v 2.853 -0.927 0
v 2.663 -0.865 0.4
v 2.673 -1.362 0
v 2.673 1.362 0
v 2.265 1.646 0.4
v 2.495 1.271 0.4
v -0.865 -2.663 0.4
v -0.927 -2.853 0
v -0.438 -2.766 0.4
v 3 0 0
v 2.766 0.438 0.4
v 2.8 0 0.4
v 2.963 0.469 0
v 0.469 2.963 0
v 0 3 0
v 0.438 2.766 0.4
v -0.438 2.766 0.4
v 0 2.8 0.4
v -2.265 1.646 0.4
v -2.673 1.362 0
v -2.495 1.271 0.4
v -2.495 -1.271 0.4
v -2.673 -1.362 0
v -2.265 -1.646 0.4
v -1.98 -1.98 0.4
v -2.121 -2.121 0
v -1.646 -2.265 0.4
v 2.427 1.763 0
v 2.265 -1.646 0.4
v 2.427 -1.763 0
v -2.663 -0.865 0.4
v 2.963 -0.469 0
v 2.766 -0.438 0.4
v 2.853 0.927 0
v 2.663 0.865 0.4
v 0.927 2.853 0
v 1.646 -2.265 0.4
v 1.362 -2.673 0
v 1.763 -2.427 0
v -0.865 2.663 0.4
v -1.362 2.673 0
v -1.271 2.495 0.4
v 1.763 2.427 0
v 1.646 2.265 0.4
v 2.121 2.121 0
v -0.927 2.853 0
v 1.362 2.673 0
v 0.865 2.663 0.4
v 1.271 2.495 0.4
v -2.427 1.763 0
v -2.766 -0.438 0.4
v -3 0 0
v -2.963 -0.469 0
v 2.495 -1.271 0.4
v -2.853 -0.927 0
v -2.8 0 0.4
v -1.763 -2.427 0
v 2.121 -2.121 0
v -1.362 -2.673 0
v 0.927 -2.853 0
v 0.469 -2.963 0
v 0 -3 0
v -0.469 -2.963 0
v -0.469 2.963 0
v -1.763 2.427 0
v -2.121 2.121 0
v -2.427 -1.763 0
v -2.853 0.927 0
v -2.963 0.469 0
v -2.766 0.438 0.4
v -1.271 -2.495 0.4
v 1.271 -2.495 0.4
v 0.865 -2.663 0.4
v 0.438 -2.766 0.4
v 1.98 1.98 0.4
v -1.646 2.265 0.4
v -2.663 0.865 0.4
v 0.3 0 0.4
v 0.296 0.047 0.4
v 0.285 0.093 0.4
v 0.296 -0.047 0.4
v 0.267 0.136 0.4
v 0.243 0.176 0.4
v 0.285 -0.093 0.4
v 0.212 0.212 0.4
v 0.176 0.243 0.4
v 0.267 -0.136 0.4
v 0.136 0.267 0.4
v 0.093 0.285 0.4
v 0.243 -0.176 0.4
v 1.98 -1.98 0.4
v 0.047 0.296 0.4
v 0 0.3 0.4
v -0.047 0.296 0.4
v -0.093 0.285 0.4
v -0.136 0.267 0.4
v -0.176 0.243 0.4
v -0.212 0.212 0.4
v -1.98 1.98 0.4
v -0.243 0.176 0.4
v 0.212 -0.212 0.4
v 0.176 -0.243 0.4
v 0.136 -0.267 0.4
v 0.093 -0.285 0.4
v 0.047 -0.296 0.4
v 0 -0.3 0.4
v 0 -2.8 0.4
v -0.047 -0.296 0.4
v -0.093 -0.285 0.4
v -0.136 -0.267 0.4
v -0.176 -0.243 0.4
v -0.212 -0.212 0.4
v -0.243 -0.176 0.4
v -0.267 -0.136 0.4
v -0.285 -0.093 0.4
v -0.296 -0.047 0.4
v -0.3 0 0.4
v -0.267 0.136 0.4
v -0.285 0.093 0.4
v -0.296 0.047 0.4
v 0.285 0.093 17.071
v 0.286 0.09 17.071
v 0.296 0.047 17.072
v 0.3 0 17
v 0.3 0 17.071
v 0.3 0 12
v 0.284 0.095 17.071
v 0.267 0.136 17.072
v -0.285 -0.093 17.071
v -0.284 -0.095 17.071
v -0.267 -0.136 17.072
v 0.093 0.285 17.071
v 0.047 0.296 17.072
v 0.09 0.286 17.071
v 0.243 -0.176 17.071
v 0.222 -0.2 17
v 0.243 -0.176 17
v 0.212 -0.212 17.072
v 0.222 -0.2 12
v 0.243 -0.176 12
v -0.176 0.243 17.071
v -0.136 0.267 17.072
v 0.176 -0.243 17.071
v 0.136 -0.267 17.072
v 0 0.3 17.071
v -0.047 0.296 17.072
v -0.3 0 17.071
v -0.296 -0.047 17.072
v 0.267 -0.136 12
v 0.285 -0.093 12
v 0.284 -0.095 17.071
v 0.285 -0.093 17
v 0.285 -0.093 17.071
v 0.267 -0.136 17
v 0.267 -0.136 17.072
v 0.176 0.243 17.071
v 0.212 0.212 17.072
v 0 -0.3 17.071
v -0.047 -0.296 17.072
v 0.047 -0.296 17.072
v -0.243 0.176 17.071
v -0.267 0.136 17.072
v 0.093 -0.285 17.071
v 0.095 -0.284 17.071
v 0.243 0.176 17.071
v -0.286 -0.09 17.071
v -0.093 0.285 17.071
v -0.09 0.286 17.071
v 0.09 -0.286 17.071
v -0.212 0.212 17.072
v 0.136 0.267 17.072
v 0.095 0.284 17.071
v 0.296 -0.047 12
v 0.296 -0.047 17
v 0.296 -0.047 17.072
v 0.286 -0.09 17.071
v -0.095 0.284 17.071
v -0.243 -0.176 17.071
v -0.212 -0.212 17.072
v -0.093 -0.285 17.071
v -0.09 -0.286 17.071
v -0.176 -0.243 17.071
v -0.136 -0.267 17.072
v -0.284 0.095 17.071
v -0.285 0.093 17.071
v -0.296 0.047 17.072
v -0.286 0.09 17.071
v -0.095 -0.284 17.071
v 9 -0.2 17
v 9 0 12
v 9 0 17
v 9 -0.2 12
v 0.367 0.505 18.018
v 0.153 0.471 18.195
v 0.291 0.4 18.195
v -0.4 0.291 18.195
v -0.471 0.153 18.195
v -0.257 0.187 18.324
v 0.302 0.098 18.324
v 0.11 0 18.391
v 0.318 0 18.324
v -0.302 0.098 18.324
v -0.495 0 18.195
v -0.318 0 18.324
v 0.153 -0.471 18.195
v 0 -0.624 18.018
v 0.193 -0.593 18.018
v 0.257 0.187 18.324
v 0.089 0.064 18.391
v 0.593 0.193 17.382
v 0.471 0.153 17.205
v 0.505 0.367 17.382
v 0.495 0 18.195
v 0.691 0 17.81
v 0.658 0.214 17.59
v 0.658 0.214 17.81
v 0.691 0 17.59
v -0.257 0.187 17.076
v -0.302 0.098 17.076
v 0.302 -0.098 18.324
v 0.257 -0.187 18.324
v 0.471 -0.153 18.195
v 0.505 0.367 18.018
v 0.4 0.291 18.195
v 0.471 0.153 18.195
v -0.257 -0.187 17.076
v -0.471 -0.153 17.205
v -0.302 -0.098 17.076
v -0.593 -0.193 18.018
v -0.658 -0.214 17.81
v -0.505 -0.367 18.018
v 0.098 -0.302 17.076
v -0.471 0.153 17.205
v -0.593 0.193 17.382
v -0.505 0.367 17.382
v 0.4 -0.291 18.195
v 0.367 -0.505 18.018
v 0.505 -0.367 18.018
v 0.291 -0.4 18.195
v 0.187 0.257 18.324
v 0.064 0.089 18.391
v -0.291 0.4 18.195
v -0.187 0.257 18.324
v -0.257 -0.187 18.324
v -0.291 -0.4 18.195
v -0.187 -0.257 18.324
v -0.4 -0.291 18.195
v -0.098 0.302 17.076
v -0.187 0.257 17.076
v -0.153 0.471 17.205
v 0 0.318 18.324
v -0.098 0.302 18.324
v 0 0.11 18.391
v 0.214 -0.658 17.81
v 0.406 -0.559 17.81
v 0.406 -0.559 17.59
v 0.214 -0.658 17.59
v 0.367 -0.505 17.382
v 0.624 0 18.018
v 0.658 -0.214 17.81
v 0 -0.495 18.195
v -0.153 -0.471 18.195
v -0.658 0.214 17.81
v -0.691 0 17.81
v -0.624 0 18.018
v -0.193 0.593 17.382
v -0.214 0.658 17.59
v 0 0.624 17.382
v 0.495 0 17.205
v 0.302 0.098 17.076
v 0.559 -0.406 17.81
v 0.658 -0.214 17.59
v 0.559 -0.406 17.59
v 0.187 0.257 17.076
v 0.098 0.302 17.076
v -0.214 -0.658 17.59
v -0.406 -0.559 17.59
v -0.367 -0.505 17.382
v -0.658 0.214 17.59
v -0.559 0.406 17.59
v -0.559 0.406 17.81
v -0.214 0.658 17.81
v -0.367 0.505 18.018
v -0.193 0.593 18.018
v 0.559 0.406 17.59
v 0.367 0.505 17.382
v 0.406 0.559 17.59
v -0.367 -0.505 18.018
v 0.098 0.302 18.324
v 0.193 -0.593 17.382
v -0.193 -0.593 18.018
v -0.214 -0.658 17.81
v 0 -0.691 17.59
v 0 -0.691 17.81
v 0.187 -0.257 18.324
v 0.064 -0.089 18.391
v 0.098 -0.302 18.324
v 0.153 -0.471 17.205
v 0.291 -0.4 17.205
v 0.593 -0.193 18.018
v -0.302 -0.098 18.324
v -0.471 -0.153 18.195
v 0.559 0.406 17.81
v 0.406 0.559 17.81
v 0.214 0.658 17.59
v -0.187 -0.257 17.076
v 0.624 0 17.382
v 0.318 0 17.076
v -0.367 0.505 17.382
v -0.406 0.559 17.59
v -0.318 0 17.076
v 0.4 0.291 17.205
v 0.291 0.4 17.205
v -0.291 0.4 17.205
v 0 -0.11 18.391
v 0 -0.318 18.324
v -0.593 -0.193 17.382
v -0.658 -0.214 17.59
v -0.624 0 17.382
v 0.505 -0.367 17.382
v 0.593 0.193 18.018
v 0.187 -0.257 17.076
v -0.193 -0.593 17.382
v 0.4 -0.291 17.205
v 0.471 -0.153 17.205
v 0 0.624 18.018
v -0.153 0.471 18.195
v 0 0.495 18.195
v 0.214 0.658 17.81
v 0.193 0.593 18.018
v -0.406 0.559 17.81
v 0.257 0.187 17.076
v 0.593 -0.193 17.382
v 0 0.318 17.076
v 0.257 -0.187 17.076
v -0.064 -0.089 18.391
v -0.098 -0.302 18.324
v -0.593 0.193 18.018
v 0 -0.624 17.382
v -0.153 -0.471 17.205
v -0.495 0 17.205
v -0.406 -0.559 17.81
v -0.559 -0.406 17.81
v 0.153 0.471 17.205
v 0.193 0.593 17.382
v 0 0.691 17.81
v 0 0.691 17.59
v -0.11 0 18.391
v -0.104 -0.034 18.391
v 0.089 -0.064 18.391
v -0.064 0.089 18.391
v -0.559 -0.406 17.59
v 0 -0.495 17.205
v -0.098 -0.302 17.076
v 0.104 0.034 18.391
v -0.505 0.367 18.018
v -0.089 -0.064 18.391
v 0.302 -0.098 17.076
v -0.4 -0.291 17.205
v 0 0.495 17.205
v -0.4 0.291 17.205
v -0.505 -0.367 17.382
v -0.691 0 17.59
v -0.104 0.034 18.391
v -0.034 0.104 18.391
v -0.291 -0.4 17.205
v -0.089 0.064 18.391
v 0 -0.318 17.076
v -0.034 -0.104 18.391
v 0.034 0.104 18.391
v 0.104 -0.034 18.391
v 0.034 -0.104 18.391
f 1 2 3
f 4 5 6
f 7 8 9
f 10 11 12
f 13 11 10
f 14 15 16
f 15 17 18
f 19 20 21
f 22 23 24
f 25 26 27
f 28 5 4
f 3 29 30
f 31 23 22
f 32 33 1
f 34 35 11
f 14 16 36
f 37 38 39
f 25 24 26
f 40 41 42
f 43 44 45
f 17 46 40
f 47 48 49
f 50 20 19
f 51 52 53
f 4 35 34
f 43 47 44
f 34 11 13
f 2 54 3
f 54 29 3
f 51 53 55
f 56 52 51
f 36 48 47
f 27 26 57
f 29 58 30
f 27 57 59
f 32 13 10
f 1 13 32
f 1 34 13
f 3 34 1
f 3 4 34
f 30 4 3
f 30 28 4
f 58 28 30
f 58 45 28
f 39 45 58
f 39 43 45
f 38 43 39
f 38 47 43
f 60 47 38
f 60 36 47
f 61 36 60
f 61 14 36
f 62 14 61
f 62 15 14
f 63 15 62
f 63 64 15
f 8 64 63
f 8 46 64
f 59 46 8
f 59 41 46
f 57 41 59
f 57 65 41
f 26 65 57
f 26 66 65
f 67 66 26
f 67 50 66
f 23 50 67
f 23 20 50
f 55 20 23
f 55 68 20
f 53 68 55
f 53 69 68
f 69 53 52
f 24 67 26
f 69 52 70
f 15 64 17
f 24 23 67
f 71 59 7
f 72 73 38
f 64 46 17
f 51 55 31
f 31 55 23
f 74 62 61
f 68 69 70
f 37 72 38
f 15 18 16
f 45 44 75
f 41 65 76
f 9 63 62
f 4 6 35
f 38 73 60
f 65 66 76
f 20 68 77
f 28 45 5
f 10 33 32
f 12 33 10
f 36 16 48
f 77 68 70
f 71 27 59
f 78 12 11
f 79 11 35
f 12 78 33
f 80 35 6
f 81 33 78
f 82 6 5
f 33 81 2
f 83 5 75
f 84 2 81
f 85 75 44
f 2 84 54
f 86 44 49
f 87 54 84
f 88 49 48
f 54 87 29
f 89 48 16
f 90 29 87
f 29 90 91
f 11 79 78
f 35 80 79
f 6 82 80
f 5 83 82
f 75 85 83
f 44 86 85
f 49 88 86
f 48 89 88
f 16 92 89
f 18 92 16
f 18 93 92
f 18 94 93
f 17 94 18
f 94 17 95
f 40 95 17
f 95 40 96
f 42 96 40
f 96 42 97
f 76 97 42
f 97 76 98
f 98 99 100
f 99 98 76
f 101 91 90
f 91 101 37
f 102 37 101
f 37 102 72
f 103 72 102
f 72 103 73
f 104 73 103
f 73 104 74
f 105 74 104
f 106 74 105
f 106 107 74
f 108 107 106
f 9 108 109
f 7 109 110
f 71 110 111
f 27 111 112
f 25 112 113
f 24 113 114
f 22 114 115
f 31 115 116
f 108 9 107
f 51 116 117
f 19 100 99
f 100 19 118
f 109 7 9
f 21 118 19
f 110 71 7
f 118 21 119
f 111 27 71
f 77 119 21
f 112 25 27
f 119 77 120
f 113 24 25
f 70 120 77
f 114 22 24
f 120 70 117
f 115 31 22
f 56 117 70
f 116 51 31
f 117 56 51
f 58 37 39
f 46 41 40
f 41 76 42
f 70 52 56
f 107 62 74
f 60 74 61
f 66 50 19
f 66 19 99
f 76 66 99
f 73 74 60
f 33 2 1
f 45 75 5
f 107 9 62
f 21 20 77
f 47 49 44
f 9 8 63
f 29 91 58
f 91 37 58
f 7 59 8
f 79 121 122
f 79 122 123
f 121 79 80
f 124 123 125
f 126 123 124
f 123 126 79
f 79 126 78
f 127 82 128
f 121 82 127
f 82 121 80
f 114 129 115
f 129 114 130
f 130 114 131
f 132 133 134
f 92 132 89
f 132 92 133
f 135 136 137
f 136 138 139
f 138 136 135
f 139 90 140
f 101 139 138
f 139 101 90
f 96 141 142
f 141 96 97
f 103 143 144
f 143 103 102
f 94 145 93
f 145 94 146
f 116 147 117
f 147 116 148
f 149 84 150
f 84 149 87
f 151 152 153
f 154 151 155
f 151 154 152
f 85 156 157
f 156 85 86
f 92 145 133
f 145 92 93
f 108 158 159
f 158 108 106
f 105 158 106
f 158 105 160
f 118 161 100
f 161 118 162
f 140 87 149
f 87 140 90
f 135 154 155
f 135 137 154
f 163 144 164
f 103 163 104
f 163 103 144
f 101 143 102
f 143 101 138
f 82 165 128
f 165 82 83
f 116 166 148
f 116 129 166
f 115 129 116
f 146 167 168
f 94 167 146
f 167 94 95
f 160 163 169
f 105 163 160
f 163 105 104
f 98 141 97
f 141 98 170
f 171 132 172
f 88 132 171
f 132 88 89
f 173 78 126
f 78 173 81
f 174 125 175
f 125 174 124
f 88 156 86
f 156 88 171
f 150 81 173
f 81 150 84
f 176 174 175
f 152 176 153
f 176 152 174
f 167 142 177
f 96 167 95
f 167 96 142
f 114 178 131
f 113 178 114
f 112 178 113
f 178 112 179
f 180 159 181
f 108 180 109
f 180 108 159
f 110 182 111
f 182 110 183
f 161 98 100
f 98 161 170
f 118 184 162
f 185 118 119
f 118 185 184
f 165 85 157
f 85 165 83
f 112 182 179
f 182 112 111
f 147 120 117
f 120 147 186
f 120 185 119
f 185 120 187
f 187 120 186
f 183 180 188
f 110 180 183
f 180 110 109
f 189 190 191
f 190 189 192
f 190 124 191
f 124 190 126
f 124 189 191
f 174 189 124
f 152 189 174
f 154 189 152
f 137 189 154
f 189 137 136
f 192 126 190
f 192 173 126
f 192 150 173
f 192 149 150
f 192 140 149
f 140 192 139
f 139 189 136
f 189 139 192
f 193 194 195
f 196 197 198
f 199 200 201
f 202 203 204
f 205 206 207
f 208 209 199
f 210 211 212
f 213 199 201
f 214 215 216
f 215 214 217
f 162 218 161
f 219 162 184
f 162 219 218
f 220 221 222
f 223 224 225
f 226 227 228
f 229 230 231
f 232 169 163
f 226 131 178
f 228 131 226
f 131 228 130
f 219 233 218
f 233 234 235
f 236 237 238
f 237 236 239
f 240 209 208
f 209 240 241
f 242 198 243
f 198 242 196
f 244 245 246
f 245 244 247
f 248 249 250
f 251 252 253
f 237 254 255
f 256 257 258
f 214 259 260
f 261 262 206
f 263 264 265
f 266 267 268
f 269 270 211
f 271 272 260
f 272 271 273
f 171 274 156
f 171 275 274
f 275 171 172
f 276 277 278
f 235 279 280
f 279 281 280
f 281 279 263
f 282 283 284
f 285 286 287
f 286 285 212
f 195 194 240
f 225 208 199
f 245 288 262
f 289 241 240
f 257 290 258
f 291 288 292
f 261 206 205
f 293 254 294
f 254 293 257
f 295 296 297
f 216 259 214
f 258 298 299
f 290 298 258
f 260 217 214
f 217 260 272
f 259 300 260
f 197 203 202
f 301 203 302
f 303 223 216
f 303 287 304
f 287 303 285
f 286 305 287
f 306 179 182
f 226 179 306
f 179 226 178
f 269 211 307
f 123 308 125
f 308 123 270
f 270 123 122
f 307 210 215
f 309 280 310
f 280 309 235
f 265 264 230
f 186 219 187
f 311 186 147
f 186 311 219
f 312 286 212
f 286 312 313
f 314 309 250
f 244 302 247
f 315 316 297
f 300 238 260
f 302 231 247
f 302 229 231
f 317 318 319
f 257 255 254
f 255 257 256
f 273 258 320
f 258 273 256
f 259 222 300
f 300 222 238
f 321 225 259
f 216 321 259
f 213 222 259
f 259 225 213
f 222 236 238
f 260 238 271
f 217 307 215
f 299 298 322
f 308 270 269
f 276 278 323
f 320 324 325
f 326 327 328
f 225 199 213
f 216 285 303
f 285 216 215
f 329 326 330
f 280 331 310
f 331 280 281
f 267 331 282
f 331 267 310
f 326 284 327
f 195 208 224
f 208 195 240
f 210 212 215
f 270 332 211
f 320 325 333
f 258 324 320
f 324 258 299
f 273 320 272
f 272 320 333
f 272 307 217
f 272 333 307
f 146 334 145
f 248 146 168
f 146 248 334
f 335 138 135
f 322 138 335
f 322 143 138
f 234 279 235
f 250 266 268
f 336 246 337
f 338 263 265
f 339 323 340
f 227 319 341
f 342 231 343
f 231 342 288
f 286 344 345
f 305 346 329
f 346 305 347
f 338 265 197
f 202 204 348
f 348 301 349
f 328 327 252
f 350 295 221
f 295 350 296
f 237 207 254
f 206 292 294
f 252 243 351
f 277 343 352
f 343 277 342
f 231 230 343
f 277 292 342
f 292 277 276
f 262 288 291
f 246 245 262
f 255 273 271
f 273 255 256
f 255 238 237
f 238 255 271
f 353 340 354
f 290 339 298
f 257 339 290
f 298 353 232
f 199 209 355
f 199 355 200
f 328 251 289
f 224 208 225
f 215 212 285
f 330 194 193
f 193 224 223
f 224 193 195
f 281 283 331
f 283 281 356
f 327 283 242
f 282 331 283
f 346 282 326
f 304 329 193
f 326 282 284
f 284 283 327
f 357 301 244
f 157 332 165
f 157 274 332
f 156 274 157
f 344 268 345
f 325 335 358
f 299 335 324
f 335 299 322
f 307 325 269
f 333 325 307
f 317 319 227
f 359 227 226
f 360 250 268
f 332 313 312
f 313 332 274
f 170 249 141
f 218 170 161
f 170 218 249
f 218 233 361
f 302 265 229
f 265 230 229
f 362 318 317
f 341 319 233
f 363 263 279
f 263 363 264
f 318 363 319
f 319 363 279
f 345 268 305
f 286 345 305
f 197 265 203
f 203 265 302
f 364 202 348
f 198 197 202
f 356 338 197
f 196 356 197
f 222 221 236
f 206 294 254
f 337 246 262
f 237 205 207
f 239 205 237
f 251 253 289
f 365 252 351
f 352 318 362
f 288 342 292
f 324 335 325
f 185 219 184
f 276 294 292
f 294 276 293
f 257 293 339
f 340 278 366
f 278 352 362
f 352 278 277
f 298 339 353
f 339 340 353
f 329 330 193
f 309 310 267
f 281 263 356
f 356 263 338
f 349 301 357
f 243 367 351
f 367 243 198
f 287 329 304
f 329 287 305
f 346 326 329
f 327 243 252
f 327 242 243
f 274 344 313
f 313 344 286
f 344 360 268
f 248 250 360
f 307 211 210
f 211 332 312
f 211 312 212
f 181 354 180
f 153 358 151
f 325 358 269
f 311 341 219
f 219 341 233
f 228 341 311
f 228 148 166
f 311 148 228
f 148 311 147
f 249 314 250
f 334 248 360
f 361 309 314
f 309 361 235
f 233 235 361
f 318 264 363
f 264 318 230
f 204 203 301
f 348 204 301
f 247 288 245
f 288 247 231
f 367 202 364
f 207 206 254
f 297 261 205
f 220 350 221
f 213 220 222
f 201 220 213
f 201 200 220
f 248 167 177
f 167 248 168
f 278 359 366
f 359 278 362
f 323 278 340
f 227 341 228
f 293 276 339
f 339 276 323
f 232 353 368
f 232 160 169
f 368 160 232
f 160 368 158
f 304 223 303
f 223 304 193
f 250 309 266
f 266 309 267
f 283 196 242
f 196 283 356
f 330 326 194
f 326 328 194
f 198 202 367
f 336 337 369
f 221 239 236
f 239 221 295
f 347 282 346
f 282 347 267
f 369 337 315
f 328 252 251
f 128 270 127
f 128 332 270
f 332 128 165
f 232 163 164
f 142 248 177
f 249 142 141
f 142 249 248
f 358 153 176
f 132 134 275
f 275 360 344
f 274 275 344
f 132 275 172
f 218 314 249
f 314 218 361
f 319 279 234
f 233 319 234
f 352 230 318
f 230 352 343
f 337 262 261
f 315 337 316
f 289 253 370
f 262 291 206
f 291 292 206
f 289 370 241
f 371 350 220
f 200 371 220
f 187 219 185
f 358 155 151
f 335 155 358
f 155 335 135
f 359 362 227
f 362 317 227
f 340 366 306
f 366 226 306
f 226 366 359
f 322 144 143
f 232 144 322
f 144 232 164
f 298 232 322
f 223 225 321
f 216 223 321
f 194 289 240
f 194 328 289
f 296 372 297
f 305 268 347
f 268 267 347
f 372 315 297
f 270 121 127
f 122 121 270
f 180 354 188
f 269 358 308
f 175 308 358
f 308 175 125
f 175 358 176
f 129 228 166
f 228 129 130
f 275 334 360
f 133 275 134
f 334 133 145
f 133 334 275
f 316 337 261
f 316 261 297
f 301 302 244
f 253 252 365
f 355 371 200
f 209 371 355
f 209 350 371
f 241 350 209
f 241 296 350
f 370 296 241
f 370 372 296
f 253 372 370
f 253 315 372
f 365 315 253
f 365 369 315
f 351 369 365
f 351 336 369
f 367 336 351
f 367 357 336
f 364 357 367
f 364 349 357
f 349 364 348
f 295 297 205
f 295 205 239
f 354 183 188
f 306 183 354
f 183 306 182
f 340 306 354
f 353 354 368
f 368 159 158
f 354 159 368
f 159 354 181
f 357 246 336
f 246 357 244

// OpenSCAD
color("gray"){
cylinder(0.4,3,2.8, $fn =40);

translate([0,0,0.3])
cylinder(17,0.3,0.3, $fn = 40);

}


color("gray")

translate([0,0,17.7], $fn = 20)
sphere(r =0.7);


translate([0,0,12])

rotate([90,0,0]){

color("gray")
cube([9,5,0.1]);

color("green")
translate([0,0,0.1])
cube([3,5,0.1]);

color("white")
translate([3,0,0.1])
cube([3,5,0.1]);


color("red")
translate([6,0,0.1])
cube([3,5,0.1]);


}
